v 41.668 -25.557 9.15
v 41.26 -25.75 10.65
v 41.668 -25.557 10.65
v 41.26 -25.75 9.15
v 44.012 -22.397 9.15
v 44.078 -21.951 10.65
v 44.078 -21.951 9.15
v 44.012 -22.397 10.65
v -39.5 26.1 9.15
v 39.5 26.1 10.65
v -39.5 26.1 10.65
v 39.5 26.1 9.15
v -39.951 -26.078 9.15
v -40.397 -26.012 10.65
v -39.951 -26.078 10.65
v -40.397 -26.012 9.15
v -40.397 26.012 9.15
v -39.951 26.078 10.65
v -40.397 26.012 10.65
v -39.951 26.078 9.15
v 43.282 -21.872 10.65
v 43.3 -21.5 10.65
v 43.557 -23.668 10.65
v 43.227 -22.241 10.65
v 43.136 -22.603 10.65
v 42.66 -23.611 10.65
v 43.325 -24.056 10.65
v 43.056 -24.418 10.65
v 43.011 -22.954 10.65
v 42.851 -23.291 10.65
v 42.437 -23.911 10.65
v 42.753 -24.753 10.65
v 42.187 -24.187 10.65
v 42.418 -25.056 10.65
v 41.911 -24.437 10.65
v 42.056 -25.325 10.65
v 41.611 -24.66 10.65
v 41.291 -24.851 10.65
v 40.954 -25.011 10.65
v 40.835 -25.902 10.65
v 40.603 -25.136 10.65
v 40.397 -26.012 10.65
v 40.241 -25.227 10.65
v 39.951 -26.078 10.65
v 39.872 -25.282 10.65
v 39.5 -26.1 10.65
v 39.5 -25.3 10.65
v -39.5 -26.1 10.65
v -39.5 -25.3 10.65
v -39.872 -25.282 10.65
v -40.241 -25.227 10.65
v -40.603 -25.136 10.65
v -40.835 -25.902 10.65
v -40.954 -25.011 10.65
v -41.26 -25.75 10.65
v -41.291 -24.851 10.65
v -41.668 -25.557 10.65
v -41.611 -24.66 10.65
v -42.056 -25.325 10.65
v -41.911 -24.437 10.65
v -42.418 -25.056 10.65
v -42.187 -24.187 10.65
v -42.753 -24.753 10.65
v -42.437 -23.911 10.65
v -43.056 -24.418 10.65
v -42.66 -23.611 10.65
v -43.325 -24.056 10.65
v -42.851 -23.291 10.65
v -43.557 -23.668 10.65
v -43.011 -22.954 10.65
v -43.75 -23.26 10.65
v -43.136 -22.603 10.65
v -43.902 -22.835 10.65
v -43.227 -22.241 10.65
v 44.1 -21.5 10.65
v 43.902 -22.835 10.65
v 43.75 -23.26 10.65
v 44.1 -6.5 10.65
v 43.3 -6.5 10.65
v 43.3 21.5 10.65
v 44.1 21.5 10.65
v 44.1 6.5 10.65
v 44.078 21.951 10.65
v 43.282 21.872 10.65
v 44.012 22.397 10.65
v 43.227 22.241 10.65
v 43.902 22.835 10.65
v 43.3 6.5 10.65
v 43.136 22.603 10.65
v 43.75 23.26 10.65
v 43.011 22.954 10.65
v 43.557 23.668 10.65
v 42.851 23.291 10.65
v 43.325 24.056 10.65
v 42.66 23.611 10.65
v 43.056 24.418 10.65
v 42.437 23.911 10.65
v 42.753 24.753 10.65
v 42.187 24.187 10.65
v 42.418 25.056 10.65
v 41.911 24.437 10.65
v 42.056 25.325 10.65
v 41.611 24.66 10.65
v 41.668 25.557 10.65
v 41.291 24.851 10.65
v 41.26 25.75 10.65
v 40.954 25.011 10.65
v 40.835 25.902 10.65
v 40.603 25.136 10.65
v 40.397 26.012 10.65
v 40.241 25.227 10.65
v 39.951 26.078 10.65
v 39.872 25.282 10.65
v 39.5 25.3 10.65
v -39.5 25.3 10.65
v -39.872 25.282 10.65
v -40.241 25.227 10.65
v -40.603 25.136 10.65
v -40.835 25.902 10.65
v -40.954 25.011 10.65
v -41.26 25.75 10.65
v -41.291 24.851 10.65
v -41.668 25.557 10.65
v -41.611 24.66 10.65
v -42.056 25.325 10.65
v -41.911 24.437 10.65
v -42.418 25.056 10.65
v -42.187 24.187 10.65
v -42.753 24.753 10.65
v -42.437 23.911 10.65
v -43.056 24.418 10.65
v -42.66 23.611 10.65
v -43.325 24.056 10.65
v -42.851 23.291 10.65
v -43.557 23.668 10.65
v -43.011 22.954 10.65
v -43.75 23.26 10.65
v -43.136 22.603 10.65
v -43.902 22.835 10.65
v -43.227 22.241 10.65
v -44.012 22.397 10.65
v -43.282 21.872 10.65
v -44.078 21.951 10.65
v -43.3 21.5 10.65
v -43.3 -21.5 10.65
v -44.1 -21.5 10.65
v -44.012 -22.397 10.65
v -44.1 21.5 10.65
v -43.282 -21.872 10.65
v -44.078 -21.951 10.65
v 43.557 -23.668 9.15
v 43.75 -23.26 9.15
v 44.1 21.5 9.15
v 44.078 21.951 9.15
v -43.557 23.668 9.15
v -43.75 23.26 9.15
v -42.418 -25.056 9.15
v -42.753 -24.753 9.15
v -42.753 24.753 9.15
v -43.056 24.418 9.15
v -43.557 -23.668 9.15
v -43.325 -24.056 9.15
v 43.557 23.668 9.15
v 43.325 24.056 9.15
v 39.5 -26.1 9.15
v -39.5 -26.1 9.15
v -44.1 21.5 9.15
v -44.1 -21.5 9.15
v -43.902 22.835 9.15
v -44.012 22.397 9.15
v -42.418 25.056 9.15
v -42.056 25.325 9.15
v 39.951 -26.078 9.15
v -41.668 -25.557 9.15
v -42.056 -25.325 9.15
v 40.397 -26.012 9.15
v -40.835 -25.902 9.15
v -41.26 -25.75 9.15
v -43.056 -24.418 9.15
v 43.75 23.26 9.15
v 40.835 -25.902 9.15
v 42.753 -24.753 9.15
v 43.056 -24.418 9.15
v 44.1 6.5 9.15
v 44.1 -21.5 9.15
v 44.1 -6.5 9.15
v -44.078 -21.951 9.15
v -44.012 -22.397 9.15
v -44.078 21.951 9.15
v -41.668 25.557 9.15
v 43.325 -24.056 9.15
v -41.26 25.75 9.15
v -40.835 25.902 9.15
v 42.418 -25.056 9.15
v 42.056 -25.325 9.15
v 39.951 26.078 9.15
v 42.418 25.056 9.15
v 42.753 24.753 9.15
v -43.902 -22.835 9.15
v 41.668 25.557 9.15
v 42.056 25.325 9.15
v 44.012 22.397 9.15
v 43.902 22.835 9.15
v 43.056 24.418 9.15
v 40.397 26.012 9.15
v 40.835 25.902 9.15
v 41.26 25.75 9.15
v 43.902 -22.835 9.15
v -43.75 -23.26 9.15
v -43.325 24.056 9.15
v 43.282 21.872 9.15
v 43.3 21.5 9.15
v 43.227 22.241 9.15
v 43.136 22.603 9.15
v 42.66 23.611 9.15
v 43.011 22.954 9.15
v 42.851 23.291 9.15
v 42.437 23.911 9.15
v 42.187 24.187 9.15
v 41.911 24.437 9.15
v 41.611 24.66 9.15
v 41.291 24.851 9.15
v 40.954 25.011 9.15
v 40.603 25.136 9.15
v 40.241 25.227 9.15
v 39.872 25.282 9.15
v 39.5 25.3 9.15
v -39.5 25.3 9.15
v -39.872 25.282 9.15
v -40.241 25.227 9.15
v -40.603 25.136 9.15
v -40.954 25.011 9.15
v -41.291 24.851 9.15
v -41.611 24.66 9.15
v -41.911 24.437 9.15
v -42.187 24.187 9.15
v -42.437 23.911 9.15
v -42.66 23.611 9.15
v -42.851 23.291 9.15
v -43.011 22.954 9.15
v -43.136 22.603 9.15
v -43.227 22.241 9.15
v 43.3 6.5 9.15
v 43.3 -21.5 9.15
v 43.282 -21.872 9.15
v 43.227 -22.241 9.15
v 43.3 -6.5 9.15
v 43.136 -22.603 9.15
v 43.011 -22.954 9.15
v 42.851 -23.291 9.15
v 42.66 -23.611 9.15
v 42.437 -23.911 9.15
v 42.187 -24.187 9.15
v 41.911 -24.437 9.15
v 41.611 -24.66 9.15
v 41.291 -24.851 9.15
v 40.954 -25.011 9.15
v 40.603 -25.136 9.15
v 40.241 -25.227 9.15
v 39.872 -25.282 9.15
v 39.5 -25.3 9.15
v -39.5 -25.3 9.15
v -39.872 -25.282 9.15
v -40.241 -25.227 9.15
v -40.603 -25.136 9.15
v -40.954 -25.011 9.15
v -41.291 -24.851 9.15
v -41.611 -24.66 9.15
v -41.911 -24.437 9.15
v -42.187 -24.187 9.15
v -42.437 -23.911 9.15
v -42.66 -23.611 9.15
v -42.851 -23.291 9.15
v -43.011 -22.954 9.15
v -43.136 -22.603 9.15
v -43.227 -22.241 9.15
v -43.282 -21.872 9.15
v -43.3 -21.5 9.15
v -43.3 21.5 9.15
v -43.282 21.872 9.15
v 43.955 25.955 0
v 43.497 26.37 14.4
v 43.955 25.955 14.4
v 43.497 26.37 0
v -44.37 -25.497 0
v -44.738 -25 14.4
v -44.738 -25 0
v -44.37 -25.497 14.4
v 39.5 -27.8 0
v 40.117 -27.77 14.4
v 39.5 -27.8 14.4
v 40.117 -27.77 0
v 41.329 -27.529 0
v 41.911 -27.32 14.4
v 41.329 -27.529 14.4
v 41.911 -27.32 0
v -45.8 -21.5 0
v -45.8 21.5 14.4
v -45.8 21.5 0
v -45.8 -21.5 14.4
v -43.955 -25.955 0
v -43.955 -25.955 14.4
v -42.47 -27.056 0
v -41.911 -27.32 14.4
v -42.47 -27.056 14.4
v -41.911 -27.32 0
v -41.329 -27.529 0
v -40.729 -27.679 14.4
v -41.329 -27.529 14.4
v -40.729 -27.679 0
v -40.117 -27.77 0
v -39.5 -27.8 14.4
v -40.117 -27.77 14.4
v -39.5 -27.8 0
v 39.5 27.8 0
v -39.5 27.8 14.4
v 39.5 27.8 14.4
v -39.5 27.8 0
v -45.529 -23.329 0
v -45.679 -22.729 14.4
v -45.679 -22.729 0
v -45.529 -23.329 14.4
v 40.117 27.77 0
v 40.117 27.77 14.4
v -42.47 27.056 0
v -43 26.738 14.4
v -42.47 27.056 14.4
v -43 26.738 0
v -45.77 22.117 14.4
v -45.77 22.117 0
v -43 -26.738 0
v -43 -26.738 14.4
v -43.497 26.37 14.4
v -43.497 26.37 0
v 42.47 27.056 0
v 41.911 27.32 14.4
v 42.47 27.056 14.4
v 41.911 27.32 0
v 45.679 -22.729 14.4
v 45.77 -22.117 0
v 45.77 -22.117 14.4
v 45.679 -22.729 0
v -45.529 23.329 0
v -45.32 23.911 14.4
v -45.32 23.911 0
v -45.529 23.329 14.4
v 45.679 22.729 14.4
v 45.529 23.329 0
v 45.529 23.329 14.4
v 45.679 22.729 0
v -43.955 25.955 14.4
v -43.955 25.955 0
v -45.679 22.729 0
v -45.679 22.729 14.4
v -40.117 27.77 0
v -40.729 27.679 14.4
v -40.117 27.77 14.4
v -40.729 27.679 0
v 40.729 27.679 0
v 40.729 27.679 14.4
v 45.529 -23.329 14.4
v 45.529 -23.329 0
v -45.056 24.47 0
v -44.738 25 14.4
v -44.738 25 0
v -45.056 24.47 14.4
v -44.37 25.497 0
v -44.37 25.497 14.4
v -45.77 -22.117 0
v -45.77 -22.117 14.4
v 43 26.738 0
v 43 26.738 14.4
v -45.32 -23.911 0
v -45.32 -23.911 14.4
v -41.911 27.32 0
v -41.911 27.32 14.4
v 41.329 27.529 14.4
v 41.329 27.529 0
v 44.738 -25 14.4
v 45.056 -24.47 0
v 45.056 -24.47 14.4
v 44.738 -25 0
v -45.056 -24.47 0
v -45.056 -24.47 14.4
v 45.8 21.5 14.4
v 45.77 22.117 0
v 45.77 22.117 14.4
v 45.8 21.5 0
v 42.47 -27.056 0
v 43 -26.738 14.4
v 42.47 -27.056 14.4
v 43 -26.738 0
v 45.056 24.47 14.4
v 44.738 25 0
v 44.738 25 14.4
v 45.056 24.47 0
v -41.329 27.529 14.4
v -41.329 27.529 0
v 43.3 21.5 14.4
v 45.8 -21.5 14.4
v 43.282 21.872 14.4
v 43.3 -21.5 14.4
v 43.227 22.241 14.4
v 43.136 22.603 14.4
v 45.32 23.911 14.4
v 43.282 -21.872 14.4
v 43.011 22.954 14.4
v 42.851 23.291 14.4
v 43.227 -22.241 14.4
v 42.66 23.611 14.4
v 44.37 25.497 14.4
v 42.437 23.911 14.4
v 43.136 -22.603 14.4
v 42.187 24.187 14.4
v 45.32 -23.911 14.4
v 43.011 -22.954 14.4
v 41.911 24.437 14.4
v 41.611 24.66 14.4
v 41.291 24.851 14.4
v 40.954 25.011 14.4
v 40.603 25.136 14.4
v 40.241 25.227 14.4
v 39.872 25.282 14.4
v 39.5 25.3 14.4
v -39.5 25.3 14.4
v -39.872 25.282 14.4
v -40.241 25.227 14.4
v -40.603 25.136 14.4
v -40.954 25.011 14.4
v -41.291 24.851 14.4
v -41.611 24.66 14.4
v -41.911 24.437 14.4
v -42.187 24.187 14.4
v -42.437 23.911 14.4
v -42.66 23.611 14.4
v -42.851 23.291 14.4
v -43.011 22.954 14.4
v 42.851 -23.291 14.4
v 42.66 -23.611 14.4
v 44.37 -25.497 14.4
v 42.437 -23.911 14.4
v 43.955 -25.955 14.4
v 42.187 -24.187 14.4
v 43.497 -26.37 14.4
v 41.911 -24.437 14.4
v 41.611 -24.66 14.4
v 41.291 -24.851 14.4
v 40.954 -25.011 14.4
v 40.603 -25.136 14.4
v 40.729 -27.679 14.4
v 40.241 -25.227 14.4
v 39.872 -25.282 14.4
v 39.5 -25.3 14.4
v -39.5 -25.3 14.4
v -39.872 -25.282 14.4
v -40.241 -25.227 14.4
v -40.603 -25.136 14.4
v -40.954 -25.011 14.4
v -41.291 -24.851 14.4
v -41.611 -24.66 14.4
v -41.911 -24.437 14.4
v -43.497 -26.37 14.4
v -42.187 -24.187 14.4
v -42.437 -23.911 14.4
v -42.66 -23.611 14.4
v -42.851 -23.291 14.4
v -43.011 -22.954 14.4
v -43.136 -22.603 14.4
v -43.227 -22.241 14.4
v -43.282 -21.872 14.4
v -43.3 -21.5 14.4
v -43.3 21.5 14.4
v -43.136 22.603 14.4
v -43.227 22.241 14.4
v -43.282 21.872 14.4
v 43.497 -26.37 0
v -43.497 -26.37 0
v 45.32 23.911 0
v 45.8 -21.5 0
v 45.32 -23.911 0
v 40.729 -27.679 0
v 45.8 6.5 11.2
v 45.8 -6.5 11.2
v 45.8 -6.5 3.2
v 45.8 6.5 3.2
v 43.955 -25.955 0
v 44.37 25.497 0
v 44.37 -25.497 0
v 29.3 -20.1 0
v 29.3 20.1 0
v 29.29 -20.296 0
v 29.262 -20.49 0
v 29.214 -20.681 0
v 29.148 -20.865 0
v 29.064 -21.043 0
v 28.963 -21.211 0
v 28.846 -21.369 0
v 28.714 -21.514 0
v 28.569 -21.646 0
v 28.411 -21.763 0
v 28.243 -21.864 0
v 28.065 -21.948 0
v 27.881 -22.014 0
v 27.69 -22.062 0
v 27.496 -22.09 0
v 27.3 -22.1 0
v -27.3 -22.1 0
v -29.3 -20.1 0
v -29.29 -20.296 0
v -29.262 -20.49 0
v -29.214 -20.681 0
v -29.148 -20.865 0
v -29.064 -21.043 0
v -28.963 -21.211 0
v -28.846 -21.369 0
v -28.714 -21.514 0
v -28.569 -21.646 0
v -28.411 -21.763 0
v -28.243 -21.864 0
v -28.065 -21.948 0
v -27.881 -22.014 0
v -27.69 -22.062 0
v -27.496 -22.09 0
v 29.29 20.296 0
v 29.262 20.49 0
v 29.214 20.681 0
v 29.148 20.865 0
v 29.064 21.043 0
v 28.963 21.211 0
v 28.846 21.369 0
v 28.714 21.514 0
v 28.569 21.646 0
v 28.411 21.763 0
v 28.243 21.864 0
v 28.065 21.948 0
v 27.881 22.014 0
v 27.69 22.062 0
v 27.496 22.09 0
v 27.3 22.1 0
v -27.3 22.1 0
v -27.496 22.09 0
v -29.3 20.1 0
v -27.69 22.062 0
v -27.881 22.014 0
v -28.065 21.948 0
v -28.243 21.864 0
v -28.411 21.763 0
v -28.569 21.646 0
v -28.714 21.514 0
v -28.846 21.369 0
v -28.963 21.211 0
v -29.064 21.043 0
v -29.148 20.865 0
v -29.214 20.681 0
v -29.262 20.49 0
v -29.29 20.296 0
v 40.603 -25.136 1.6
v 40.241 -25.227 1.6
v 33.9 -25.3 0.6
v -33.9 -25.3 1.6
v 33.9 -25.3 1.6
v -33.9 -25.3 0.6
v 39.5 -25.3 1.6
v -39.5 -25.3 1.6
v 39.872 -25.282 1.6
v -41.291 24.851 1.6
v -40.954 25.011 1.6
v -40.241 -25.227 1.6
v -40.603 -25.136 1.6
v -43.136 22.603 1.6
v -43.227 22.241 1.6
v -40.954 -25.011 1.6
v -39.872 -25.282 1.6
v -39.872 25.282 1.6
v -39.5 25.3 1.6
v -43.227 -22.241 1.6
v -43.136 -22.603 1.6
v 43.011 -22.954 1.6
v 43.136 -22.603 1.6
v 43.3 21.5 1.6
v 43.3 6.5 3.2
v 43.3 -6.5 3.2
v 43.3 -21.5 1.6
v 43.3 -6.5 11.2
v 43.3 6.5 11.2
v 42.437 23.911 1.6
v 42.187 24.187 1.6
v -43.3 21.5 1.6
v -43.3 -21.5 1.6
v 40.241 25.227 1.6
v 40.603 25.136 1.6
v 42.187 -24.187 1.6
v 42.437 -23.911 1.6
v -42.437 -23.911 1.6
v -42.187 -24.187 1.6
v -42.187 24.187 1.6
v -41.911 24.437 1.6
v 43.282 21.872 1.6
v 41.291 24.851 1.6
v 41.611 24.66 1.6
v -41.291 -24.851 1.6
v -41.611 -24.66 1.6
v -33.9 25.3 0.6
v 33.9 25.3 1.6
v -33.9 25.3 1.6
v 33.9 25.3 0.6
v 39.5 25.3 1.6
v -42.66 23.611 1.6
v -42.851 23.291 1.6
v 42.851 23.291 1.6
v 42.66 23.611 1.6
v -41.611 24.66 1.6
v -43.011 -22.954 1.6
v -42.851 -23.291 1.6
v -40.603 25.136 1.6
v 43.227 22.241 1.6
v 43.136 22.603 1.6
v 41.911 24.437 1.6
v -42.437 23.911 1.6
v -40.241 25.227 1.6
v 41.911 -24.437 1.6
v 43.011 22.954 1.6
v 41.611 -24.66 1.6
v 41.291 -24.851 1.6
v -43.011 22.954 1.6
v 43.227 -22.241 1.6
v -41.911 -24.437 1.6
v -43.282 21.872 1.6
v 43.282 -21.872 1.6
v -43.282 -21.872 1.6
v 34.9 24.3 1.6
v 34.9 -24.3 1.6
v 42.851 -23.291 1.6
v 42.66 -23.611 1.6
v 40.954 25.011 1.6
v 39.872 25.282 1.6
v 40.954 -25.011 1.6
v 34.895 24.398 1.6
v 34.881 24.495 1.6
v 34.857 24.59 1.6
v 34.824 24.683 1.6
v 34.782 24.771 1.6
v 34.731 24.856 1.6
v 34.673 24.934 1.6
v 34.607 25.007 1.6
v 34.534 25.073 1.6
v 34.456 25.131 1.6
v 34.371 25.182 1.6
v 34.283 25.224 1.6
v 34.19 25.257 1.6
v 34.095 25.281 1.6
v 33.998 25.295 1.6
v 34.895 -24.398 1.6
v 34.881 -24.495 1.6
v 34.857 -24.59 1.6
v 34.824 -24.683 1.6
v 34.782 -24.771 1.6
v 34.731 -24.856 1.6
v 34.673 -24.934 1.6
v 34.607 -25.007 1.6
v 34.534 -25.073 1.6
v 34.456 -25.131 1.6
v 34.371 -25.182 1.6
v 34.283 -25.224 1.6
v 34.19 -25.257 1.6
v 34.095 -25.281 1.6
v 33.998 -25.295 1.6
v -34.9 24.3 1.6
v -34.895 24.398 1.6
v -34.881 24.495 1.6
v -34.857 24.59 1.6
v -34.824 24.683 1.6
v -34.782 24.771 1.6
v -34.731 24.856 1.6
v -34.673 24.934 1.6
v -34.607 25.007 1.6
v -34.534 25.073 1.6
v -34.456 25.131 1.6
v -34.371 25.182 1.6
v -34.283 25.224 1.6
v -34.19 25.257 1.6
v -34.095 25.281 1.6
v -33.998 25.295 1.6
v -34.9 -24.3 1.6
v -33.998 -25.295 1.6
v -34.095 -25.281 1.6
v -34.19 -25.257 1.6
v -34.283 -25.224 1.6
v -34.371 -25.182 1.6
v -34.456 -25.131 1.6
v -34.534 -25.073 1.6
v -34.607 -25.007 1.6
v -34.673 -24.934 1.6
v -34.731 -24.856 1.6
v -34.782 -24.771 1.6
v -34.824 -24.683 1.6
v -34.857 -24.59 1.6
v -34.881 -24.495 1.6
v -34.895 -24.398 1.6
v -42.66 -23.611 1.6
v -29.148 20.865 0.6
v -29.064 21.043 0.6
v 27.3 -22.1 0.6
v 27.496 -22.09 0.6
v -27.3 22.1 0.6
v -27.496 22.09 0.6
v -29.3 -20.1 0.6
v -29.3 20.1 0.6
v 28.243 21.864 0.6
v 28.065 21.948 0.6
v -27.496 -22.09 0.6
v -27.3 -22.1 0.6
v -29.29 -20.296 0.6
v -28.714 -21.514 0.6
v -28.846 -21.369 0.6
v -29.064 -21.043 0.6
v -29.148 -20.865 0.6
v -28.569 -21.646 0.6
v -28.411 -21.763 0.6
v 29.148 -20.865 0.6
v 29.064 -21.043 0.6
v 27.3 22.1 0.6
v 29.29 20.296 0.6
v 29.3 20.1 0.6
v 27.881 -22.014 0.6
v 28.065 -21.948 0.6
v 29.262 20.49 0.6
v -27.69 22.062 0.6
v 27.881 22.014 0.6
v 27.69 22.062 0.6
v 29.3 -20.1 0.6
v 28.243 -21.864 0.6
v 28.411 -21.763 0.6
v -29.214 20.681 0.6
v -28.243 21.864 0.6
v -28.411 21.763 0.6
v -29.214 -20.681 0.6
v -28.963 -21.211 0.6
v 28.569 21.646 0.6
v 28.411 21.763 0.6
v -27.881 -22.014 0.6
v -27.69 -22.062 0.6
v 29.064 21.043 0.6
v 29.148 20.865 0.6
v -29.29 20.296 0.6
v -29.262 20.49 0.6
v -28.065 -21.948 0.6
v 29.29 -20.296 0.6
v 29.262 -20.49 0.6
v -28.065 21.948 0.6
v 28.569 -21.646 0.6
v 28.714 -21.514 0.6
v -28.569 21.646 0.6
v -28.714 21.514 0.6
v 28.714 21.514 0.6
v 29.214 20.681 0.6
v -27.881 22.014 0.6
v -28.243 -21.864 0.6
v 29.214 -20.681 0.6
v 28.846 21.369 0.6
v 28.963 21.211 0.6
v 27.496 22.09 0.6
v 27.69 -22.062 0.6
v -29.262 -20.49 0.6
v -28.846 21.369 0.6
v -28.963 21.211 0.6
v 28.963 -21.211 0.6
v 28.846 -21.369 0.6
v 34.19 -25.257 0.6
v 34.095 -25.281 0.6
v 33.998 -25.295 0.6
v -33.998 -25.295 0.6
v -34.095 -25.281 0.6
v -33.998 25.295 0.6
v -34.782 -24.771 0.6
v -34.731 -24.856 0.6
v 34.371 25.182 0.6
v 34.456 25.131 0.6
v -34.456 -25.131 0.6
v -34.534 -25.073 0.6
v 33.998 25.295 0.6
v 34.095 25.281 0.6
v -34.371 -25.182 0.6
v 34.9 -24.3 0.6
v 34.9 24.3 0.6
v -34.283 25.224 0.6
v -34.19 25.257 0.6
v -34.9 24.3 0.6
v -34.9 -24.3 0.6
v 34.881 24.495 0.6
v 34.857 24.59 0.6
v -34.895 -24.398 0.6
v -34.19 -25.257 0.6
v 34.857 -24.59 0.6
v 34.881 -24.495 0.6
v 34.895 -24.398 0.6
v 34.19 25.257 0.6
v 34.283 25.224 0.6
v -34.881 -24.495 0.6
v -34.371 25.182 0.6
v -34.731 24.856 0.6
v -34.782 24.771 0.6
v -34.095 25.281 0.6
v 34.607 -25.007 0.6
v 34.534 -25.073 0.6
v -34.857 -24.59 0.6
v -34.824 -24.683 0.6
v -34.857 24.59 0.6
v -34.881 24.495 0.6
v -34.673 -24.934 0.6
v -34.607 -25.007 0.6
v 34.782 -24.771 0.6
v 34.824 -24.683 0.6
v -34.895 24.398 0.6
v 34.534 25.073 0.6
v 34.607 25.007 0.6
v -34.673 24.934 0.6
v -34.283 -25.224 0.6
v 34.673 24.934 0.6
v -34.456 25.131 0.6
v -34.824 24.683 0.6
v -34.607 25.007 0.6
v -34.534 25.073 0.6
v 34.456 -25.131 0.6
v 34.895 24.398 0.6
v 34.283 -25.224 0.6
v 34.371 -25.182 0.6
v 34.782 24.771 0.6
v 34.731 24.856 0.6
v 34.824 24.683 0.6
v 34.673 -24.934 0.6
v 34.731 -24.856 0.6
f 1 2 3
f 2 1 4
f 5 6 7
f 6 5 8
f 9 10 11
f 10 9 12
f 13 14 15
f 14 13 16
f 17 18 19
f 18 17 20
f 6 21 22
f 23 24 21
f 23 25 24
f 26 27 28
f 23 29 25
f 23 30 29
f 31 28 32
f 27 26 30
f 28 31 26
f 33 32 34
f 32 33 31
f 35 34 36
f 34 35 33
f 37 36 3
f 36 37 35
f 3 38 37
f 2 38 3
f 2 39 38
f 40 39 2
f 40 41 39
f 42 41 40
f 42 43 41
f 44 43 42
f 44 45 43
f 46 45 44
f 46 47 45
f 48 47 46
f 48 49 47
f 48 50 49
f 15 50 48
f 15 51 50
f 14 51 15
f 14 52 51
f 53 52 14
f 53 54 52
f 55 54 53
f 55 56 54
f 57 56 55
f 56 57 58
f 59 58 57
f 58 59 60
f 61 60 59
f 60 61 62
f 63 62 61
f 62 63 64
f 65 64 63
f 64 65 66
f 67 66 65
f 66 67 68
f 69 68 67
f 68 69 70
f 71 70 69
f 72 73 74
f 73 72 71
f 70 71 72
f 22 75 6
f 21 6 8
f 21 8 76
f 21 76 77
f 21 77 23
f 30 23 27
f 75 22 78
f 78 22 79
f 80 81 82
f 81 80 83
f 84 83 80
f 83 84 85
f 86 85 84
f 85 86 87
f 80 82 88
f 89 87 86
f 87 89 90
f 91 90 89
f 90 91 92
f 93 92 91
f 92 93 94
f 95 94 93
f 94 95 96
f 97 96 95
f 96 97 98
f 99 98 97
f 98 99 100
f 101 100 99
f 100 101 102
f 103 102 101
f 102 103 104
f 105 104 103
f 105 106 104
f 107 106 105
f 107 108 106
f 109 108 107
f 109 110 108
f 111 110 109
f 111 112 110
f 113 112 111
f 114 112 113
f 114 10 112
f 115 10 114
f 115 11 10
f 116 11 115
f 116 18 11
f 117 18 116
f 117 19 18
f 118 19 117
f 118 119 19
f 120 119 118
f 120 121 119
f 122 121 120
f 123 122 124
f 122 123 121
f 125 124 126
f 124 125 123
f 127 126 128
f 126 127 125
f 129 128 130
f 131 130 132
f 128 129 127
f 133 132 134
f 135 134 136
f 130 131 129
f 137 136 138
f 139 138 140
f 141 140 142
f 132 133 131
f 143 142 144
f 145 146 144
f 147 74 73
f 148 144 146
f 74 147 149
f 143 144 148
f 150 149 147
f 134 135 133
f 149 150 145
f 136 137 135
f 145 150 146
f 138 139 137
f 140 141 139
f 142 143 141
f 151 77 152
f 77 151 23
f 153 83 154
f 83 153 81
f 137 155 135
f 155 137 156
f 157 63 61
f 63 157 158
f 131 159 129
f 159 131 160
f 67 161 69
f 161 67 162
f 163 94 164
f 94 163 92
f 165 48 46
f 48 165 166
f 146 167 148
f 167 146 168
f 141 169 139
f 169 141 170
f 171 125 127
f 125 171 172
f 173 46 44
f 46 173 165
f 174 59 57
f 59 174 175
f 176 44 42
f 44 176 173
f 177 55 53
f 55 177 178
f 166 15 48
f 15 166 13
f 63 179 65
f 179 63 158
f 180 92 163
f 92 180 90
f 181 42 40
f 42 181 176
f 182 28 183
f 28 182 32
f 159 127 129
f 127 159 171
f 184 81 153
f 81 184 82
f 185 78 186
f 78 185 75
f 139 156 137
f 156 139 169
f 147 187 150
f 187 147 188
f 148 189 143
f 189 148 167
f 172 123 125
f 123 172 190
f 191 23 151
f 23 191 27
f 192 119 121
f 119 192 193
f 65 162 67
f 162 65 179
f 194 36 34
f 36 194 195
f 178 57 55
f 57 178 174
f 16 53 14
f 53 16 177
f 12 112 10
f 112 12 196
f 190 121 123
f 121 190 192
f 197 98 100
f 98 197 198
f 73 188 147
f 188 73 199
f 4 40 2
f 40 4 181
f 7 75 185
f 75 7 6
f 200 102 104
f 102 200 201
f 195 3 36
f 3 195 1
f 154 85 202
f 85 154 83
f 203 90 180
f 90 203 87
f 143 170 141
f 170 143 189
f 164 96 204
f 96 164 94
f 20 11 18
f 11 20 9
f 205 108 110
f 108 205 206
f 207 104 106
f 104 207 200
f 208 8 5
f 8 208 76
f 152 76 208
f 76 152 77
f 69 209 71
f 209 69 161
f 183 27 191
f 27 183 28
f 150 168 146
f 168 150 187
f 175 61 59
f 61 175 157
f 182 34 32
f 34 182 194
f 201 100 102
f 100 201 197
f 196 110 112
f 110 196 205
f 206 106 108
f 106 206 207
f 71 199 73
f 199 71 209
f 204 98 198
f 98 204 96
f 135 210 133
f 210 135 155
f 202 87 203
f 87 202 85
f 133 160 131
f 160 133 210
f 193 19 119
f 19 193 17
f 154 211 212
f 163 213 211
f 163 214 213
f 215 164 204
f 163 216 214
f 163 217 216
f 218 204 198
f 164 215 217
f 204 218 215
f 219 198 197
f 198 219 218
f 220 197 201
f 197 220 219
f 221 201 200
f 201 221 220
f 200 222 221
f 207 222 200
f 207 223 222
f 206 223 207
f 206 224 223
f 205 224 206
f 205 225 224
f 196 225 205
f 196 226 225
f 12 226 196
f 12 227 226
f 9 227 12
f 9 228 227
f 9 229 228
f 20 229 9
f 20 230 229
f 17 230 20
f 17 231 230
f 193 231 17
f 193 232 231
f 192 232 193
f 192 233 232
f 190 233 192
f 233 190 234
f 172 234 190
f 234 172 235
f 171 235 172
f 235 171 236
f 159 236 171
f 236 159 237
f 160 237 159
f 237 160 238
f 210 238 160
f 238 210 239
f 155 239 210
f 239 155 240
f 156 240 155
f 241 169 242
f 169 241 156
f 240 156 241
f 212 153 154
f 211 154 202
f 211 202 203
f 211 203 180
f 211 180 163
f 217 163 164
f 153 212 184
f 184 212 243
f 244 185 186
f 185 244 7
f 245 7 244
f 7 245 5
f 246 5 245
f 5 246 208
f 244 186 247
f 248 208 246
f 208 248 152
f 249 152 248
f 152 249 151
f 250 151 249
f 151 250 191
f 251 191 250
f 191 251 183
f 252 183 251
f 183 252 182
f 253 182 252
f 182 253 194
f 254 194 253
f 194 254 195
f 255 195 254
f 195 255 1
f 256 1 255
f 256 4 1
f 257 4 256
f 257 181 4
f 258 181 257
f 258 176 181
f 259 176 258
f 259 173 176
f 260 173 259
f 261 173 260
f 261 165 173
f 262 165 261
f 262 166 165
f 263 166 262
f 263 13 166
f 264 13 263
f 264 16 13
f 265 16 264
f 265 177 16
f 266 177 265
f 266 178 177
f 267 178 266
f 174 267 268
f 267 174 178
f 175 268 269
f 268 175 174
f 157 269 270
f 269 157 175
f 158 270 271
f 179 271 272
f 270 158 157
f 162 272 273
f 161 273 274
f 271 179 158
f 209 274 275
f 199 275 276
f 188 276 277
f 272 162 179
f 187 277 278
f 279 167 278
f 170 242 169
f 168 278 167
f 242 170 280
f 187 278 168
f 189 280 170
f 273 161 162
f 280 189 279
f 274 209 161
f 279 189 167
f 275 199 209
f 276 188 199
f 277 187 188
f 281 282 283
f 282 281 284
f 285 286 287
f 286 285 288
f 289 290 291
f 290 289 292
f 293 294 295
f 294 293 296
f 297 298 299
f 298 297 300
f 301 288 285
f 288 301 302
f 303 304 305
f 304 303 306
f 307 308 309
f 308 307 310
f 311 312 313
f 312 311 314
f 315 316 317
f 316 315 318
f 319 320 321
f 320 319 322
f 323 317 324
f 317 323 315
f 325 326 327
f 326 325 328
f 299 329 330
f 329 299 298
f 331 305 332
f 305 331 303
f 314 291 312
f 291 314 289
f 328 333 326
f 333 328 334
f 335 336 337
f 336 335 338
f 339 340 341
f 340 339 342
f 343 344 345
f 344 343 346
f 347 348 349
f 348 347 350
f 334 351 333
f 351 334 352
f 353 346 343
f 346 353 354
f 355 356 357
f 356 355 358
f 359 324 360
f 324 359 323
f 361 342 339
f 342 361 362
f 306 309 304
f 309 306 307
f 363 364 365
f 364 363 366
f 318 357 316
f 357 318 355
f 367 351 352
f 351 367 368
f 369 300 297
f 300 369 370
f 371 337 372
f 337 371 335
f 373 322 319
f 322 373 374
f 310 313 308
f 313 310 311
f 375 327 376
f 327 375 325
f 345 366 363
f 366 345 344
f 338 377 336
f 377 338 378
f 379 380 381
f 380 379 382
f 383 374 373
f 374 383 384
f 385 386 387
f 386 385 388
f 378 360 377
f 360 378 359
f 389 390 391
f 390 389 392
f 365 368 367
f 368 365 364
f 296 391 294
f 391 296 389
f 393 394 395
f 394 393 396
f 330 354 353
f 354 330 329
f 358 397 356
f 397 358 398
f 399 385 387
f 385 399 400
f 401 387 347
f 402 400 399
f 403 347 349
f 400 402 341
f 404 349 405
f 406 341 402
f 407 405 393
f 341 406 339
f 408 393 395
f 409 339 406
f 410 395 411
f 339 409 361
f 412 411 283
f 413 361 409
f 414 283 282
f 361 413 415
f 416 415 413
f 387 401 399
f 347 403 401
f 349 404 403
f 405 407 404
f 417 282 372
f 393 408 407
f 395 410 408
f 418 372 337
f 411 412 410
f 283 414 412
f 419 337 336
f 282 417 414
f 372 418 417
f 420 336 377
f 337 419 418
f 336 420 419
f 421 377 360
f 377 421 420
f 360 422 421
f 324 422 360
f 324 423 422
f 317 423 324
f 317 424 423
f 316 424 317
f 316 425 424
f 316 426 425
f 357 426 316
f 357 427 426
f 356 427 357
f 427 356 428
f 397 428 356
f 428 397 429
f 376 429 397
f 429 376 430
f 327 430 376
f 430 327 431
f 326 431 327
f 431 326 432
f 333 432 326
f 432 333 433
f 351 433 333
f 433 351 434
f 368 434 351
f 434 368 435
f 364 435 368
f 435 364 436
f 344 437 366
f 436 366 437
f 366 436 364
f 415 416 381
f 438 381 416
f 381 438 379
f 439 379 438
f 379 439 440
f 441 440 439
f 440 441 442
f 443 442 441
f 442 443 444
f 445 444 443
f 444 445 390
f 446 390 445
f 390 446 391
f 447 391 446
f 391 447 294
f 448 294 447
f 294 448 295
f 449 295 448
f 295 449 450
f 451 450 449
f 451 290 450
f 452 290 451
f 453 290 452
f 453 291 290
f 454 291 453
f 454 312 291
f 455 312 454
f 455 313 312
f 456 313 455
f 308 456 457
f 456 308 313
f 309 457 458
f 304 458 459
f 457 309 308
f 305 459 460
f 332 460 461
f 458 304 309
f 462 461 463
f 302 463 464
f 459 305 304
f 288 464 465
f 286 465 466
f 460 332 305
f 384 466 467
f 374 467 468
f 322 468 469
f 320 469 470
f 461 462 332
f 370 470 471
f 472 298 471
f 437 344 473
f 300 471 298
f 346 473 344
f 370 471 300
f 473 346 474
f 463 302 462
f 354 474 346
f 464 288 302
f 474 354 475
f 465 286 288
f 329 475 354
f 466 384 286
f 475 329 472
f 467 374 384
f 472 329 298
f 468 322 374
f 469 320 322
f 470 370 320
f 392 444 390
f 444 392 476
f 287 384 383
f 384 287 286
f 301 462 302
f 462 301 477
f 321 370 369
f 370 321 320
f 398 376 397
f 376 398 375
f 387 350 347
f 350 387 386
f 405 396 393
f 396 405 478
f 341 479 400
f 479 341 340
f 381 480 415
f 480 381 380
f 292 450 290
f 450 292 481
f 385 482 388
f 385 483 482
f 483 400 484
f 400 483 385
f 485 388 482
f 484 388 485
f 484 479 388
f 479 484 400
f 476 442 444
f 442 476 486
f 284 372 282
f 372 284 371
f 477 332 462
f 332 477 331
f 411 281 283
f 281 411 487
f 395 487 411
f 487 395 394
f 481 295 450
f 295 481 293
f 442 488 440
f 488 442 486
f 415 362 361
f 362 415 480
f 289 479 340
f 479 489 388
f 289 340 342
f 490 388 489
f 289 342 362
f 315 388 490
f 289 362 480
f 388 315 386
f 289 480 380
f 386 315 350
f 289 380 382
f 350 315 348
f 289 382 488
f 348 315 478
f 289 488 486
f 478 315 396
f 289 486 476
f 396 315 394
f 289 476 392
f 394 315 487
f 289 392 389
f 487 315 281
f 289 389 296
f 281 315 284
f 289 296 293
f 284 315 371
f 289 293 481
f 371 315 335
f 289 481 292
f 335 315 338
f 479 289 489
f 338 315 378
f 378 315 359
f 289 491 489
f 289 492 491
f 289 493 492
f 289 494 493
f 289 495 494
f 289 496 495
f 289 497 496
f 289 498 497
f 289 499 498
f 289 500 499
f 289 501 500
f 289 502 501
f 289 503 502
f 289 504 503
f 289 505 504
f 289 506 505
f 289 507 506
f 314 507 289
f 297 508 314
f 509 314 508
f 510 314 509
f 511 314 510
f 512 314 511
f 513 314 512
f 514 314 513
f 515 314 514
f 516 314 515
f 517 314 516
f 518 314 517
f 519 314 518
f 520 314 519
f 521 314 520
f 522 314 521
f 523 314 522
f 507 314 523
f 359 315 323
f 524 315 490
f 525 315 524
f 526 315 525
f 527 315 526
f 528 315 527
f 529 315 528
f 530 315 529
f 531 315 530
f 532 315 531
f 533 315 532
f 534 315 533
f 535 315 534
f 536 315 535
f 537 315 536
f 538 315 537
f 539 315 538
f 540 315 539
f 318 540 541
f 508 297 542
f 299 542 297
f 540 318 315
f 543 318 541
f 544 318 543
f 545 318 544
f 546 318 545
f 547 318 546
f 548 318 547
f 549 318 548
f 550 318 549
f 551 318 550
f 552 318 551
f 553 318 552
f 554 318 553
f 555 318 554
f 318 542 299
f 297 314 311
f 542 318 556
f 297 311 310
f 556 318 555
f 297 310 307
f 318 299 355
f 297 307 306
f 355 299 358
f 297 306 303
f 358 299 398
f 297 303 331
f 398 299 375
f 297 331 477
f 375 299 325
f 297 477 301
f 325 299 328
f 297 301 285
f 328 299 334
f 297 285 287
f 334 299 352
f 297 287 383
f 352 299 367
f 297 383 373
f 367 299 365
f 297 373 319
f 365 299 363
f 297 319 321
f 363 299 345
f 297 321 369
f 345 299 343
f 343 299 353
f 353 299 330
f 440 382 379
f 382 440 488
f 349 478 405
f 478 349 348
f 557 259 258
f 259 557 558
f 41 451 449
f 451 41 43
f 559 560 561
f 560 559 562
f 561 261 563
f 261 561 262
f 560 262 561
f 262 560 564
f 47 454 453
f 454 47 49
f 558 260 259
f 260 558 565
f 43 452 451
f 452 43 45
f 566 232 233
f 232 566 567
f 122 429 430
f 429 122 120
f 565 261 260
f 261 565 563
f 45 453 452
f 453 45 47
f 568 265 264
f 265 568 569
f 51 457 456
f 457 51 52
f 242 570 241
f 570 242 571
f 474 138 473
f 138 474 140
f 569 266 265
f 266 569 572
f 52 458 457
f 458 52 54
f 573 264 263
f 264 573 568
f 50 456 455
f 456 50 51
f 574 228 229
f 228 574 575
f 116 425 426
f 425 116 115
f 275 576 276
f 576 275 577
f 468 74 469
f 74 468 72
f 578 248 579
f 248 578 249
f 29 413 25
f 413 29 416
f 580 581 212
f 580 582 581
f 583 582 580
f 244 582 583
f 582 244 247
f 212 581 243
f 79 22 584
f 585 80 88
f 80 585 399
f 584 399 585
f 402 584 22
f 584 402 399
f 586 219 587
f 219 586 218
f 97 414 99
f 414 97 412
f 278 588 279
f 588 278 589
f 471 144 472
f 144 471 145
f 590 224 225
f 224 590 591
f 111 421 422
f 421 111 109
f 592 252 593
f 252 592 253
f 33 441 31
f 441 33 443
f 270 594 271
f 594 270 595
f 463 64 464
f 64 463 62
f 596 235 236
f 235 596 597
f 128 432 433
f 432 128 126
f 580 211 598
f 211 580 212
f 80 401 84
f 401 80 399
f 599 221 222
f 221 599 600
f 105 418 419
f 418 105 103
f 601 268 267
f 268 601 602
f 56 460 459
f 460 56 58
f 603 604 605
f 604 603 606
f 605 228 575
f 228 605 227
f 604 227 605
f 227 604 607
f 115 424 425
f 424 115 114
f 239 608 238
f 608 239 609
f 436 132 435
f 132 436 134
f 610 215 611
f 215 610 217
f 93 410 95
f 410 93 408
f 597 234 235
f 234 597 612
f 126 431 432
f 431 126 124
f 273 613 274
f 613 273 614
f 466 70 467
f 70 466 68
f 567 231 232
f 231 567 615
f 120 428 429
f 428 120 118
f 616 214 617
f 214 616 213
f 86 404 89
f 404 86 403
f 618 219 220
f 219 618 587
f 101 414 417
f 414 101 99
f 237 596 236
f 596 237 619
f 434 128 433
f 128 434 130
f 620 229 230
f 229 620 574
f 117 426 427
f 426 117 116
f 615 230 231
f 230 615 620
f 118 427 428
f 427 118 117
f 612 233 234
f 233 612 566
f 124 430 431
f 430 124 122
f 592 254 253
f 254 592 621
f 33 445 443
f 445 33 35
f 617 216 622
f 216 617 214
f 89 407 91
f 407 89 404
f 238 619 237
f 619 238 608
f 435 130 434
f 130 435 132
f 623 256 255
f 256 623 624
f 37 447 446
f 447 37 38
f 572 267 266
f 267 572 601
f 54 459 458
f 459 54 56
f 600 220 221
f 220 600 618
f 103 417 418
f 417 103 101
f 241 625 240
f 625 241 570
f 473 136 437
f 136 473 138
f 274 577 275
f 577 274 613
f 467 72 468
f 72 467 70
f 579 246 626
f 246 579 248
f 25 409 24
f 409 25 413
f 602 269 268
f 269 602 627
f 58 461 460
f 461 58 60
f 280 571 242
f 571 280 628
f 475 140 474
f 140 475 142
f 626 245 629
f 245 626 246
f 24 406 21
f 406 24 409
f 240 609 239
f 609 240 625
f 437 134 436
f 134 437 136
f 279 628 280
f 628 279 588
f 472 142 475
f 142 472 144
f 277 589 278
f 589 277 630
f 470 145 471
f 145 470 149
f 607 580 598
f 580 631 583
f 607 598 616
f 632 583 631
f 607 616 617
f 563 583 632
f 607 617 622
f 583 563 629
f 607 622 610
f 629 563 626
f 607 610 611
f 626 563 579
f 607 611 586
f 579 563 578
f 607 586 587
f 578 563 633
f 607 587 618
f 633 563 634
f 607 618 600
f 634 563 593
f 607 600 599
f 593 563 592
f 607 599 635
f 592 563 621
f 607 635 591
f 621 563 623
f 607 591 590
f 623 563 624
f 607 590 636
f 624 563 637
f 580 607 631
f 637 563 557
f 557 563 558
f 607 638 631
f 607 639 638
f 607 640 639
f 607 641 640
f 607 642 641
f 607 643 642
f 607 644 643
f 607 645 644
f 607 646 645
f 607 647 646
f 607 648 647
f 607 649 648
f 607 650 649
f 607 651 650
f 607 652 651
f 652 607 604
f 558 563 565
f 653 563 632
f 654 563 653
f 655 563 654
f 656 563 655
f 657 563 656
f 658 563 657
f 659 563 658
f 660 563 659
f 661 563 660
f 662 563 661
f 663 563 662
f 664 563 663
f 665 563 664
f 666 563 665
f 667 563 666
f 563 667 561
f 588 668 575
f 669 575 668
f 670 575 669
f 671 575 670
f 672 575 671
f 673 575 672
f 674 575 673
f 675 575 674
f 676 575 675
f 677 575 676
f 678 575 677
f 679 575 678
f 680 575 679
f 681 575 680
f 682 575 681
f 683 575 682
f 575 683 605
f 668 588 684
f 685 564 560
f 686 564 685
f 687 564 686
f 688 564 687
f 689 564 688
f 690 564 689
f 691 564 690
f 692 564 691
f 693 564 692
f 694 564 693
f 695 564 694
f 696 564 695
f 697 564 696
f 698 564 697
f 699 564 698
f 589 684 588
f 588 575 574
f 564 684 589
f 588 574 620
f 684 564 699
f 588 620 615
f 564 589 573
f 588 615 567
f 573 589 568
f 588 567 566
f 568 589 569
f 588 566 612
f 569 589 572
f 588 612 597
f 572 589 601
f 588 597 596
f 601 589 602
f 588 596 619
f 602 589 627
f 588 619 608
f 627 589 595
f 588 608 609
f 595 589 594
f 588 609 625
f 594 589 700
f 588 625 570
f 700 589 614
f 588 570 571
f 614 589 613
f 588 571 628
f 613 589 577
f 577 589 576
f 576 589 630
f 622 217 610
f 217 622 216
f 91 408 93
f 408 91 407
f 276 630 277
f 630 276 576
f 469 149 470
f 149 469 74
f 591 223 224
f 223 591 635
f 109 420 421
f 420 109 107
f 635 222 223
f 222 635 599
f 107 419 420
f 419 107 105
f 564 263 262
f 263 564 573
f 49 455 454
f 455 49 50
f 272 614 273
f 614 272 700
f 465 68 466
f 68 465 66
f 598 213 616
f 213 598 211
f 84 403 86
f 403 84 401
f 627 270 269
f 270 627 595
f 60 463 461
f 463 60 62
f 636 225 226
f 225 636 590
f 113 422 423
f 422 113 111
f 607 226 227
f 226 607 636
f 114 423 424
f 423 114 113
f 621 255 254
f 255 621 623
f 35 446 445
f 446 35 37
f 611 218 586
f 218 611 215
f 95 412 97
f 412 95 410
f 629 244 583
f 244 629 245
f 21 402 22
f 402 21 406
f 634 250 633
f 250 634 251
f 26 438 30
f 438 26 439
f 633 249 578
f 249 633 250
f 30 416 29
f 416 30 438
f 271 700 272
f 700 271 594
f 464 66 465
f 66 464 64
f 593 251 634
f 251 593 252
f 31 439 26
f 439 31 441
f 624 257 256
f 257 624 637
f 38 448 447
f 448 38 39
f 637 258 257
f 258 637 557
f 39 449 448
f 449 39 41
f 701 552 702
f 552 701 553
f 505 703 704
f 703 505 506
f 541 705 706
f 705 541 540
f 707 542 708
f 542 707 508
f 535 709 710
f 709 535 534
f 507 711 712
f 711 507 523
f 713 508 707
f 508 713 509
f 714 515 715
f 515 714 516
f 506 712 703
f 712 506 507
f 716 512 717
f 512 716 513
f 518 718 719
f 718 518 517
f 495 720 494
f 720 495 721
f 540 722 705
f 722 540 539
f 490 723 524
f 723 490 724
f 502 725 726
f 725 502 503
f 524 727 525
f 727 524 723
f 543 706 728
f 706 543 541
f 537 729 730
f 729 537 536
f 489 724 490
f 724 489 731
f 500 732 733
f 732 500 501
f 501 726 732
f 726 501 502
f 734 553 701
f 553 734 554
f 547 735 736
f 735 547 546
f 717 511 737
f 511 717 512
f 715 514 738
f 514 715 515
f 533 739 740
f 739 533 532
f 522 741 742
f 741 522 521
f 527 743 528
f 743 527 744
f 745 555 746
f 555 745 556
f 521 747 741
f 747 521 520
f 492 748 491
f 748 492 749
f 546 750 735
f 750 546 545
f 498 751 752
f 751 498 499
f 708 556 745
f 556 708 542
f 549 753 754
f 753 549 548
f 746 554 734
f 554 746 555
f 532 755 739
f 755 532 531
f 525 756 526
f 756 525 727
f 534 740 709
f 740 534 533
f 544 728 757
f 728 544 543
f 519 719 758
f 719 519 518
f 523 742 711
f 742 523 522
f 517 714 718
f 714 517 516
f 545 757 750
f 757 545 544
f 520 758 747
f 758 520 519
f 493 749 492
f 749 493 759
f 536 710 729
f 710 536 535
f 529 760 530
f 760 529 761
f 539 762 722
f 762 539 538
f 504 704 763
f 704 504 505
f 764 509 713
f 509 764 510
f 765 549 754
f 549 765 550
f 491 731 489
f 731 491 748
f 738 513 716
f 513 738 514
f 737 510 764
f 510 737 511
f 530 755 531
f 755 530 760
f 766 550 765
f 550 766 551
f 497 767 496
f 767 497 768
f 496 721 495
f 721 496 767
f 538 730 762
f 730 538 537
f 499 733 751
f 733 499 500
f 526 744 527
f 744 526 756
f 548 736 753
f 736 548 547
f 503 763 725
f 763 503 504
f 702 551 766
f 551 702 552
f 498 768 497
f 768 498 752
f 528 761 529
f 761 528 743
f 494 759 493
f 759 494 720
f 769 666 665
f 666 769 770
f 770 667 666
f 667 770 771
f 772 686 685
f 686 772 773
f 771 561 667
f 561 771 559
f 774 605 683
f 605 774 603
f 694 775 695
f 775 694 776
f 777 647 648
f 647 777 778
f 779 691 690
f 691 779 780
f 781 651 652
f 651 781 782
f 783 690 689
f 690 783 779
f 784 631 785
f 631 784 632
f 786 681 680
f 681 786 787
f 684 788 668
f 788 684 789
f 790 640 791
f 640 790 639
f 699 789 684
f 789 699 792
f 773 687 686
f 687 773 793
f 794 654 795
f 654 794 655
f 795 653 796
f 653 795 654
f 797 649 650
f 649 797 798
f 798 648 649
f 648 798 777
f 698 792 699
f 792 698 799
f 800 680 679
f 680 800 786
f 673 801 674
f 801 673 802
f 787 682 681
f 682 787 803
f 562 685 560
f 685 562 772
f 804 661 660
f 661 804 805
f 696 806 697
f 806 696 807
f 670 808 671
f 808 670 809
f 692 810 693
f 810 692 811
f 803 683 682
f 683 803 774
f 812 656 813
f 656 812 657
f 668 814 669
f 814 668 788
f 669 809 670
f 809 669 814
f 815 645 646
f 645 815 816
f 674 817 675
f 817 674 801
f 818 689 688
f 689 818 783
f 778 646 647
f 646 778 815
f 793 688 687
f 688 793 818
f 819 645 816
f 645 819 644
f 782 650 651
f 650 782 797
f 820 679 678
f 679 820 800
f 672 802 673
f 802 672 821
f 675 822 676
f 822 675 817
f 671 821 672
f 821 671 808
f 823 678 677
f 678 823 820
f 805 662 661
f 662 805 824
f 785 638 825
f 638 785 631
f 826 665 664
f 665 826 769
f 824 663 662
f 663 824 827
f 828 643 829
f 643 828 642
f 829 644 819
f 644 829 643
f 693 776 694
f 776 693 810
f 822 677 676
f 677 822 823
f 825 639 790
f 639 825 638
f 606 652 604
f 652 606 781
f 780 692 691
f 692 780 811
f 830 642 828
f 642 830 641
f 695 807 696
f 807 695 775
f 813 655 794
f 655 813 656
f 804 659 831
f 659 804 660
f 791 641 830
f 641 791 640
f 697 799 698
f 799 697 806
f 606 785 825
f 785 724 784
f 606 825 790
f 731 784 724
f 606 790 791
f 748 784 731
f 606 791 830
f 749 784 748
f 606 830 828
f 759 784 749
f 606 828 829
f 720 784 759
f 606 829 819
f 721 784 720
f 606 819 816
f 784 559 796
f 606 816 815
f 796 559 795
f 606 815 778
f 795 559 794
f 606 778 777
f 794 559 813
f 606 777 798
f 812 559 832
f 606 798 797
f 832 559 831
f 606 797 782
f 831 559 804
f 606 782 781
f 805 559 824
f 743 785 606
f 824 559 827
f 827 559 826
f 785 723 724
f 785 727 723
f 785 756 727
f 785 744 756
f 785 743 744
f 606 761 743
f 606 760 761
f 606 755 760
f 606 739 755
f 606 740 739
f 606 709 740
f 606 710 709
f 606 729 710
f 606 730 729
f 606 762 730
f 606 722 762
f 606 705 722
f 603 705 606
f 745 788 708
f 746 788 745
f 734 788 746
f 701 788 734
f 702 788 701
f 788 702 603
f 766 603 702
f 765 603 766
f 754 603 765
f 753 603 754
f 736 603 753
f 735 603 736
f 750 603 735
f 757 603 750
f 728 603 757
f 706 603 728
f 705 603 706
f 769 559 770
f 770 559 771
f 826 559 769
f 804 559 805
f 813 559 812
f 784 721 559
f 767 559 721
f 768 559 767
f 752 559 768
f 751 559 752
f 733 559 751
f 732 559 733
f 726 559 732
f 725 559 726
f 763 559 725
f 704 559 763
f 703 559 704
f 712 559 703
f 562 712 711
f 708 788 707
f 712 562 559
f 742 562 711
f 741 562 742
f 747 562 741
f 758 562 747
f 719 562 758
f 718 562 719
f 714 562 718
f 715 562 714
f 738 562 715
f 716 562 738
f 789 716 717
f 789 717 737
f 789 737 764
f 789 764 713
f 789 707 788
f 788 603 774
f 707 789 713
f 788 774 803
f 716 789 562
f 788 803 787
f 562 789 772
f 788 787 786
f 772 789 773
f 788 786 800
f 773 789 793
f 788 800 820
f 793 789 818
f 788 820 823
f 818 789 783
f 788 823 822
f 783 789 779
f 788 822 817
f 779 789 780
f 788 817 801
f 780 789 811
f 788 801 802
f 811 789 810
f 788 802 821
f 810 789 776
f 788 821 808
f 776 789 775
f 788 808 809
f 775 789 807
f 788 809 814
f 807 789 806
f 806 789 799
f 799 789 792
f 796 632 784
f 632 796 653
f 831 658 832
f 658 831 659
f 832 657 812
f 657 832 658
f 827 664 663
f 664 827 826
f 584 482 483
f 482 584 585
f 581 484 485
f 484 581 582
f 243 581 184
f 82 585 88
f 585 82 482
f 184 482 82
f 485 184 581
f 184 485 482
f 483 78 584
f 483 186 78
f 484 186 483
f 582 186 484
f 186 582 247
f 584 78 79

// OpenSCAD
// Wall-mount enclosure for the LCDWIKI ES3C28P 2.8" ESP32-S3 display module.
//
//   - board screwed in on M3, shell closes with a snap-fit groove
//   - landscape orientation, USB-C exiting straight out of the right side
//   - two keyhole slots in the back plate for wall screws
//
// All dimensions come from the vendor drawing ES3C28P_Size.pdf, except the
// USB-C position, which that drawing only shows graphically. That opening is
// therefore deliberately generous — see usb_* below.
//
// PRINT THE TEST FRAME FIRST. part = "test" is a 3 mm sliver that checks the
// board outline, the four hole positions and the window alignment for a few
// grams of filament. Everything here was derived from a text extraction of a
// PDF, not measured on a board, so spend the ten minutes.

/* [What to render] */
// front = bezel + walls, back = lid, test = fit check
part = "front";  // [front, back, test]

/* [Board — from the vendor drawing, do not change] */
pcb_w      = 86.00;  // long axis, horizontal in landscape
pcb_h      = 50.00;  // short axis
pcb_t      = 1.60;
pcb_r      = 3.50;   // corner radius
hole_dx    = 78.00;  // mounting hole pattern, long axis
hole_dy    = 42.00;  // mounting hole pattern, short axis
hole_d     = 3.20;   // holes are 3.2, so M3 passes through
glass_above = 4.30;  // 0.5 glue + 2.3 LCD + 0.5 glue + 1.0 touch panel
comp_below  = 4.70;  // tallest component on the back

/* [Display window] */
// Visible area is 58.05 x 43.60 (VA). A little over that, so the bezel does
// not creep into the picture if the board sits a hair off centre.
win_w      = 58.60;
win_h      = 44.20;
win_off_x  = 0;      // nudge if the window looks off centre on the test frame
win_off_y  = 0;

/* [Glass recess] */
// Without this the glass sits the full bezel thickness back and you look at
// the picture down a tunnel. This pockets the inside of the bezel to the
// outline of the touch panel, so the glass moves forward and only a thin lip
// is left in front of it. The lip ends up front_t - glass_pocket thick.
//
// Set glass_pocket = front_t for a fully flush front: the glass then becomes
// the outer surface. That looks best but leaves a visible seam around the
// glass and only 2.5 mm of bezel above and below it, so it is fragile.
glass_w      = 69.20;  // touch panel, long axis
glass_h      = 50.00;  // touch panel, short axis — the full board width
glass_pocket = 1.00;   // how far forward the glass comes; leaves a 0.6 mm lip

/* [USB-C opening — verify on the test frame] */
usb_w      = 13.00;  // generous: a plug moulding is wider than the connector
usb_h      = 8.00;
usb_off_y  = 0;      // along the short axis, 0 = centred on the edge
usb_off_z  = 1.50;   // towards the back: the connector sits on the rear face

/* [How the board is held] */
// clamp  : pegs on the back plate carry the board, the bezel presses on the
//          glass, and the snap fit holds the sandwich together. No fasteners
//          at all. The snap becomes load bearing, so print it first and check
//          it grips before committing.
// screws : posts in the front, four M3 x 6. Use this if the clamp ends up
//          loose, or if you want the front removable without disturbing the
//          board.
retention = "clamp";  // [clamp, screws]

peg_od        = 5.50;
peg_spigot_d  = 3.00;  // enters the board's 3.2 mm hole to locate it
peg_spigot_h  = 1.40;  // shorter than the 1.6 mm board, so it cannot foul
peg_clearance = 0.20;  // pegs deliberately short; the bezel sets the depth

/* [Fit and tolerances — tune for your printer] */
fit        = 0.30;   // clearance around the board
wall       = 2.50;
front_t    = 1.60;   // bezel thickness
back_t     = 2.00;   // lid thickness
back_gap   = 1.20;   // air behind the tallest component
boss_od     = 5.50;
boss_pilot  = 2.50;  // M3 self-tapping into plastic
bezel_keep  = 0.60;  // material left in front of the pilot hole, so it stays
                     // blind and no hole shows on the visible face
snap_depth  = 0.80;
snap_h      = 1.50;
snap_inset  = 2.50;  // distance of the groove from the rear edge

/* [Wall mounting] */
keyhole_spacing = 60.00;
keyhole_big     = 8.00;   // screw head passes here
keyhole_small   = 4.20;   // shank slides into this
keyhole_drop    = 6.00;

/* [Hidden] */
$fn = 64;
eps = 0.01;

inner_w = pcb_w + 2 * fit;
inner_h = pcb_h + 2 * fit;

// The glass pocket pulls the whole board forward by glass_pocket, so the depth
// behind it shrinks by the same amount and the posts get shorter to match.
// Getting this wrong means the board will not seat against the bezel.
inner_d = glass_above + pcb_t + comp_below - glass_pocket + back_gap;
outer_w = inner_w + 2 * wall;
outer_h = inner_h + 2 * wall;
outer_d = front_t + inner_d + back_t;
outer_r = pcb_r + wall + fit;

post_h      = glass_above - glass_pocket;            // posts the PCB rests on
pcb_front_z = front_t - glass_pocket + glass_above;  // front face of the PCB
screw_depth = post_h + front_t - bezel_keep;         // usable thread depth

// Distance from the inside of the back plate to the back of the board. The
// pegs are this tall, less a whisker, so the bezel and not the pegs decides
// how deep the board sits.
peg_h = (front_t + inner_d) - (pcb_front_z + pcb_t) - peg_clearance;

// ---------------------------------------------------------------------------
// Helpers
// ---------------------------------------------------------------------------

module rrect(w, h, r, th) {
    linear_extrude(th)
        offset(r = r) offset(r = -r)
            square([w, h], center = true);
}

// The four mounting holes, in board coordinates centred on the board.
module at_holes() {
    for (x = [-hole_dx / 2, hole_dx / 2])
        for (y = [-hole_dy / 2, hole_dy / 2])
            translate([x, y, 0]) children();
}

// ---------------------------------------------------------------------------
// Front: bezel, side walls, board posts
// ---------------------------------------------------------------------------

module front() {
  difference() {
    union() {
      difference() {
        // outer body
        rrect(outer_w, outer_h, outer_r, outer_d);

        // cavity for the board and its components
        translate([0, 0, front_t])
            rrect(inner_w, inner_h, pcb_r + fit, inner_d + back_t + eps);

        // display window
        translate([win_off_x, win_off_y, -eps])
            rrect(win_w, win_h, 2, front_t + 2 * eps);

        // pocket on the inside of the bezel, to the outline of the touch
        // panel, so the glass comes forward instead of sitting at the back of
        // a 2 mm tunnel
        translate([win_off_x, win_off_y, front_t - glass_pocket])
            rrect(glass_w + 2 * fit, glass_h + 2 * fit, 1,
                  glass_pocket + eps);

        // USB-C, straight out of the +X side
        translate([outer_w / 2 - wall / 2, usb_off_y,
                   pcb_front_z + pcb_t / 2 + usb_off_z])
            cube([wall * 2, usb_w, usb_h], center = true);

        // snap groove, running right round the inside near the rear edge
        translate([0, 0, outer_d - back_t - snap_inset - snap_h / 2])
            difference() {
                rrect(inner_w + 2 * snap_depth, inner_h + 2 * snap_depth,
                      pcb_r + fit + snap_depth, snap_h);
                translate([0, 0, -eps])
                    rrect(inner_w - 1, inner_h - 1, pcb_r, snap_h + 2 * eps);
            }
      }

      // Posts the board screws onto. Their height puts the glass against the
      // inside of the bezel, which is what keeps the front flush.
      // Absent in clamp mode, where the back plate carries the board instead.
      if (retention == "screws")
          translate([0, 0, front_t])
              at_holes() cylinder(d = boss_od, h = post_h);
    }

    // The pilot hole runs on into the bezel and stops bezel_keep short of the
    // outside, so a 3.3 mm post still gives 4.3 mm of thread engagement
    // without a hole appearing on the visible face. Drilled from the whole
    // body, not just the post, which is why the posts are unioned in first.
    if (retention == "screws")
        translate([0, 0, front_t + post_h - screw_depth])
            at_holes() cylinder(d = boss_pilot, h = screw_depth + eps);
  }
}

// ---------------------------------------------------------------------------
// Back: lid with snap rib and keyholes
// ---------------------------------------------------------------------------

module back() {
    lip_h = snap_inset + snap_h + 1.0;

    difference() {
        union() {
            rrect(outer_w, outer_h, outer_r, back_t);

            // lip that drops into the shell
            translate([0, 0, back_t - eps])
                difference() {
                    rrect(inner_w - 0.20, inner_h - 0.20, pcb_r + fit, lip_h);
                    translate([0, 0, -eps])
                        rrect(inner_w - 3.2, inner_h - 3.2, pcb_r, lip_h + 2 * eps);
                }

            // rib that catches in the groove
            translate([0, 0, back_t + lip_h - snap_inset - snap_h])
                difference() {
                    rrect(inner_w - 0.20 + 2 * snap_depth,
                          inner_h - 0.20 + 2 * snap_depth,
                          pcb_r + fit + snap_depth, snap_h);
                    translate([0, 0, -eps])
                        rrect(inner_w - 3.2, inner_h - 3.2, pcb_r,
                              snap_h + 2 * eps);
                }

            // Pegs that carry the board in clamp mode. The shoulder sets how
            // far back the board sits and the spigot drops into its mounting
            // hole, so the board cannot shift sideways. Note the pegs land
            // where the screw posts would be, so only ever one or the other.
            if (retention == "clamp")
                translate([0, 0, back_t])
                    at_holes() {
                        cylinder(d = peg_od, h = peg_h);
                        translate([0, 0, peg_h - eps])
                            cylinder(d = peg_spigot_d, h = peg_spigot_h);
                    }
        }

        // keyhole slots for wall screws
        for (x = [-keyhole_spacing / 2, keyhole_spacing / 2])
            translate([x, 0, -eps]) {
                cylinder(d = keyhole_big, h = back_t + 2 * eps);
                translate([0, -keyhole_drop, 0])
                    cylinder(d = keyhole_small, h = back_t + 2 * eps);
                translate([0, -keyhole_drop / 2, back_t / 2 + eps])
                    cube([keyhole_small, keyhole_drop, back_t + 2 * eps],
                         center = true);
            }
    }
}

// ---------------------------------------------------------------------------
// Test frame: outline, holes and window only. Print this first.
// ---------------------------------------------------------------------------

module test_frame() {
    // Deep enough to actually hold the board, so the glass drops into the
    // pocket and you can see how flush the front sits.
    t = front_t + 3.5;
    difference() {
        rrect(outer_w, outer_h, outer_r, t);

        // board outline, so you can drop the board in and check the fit
        translate([0, 0, front_t])
            rrect(inner_w, inner_h, pcb_r + fit, t);

        // window, to check it lines up with the picture
        translate([win_off_x, win_off_y, -eps])
            rrect(win_w, win_h, 2, front_t + 2 * eps);

        // the glass pocket, which is the whole point of reprinting this
        translate([win_off_x, win_off_y, front_t - glass_pocket])
            rrect(glass_w + 2 * fit, glass_h + 2 * fit, 1, glass_pocket + eps);

        // hole positions, drilled right through
        translate([0, 0, -eps])
            at_holes() cylinder(d = hole_d, h = t + 2 * eps);

        // USB-C notch
        translate([outer_w / 2 - wall / 2, usb_off_y, t / 2])
            cube([wall * 2, usb_w, t + 2 * eps], center = true);
    }
}

// ---------------------------------------------------------------------------

if (part == "front") front();
else if (part == "back") back();
else if (part == "test") test_frame();
